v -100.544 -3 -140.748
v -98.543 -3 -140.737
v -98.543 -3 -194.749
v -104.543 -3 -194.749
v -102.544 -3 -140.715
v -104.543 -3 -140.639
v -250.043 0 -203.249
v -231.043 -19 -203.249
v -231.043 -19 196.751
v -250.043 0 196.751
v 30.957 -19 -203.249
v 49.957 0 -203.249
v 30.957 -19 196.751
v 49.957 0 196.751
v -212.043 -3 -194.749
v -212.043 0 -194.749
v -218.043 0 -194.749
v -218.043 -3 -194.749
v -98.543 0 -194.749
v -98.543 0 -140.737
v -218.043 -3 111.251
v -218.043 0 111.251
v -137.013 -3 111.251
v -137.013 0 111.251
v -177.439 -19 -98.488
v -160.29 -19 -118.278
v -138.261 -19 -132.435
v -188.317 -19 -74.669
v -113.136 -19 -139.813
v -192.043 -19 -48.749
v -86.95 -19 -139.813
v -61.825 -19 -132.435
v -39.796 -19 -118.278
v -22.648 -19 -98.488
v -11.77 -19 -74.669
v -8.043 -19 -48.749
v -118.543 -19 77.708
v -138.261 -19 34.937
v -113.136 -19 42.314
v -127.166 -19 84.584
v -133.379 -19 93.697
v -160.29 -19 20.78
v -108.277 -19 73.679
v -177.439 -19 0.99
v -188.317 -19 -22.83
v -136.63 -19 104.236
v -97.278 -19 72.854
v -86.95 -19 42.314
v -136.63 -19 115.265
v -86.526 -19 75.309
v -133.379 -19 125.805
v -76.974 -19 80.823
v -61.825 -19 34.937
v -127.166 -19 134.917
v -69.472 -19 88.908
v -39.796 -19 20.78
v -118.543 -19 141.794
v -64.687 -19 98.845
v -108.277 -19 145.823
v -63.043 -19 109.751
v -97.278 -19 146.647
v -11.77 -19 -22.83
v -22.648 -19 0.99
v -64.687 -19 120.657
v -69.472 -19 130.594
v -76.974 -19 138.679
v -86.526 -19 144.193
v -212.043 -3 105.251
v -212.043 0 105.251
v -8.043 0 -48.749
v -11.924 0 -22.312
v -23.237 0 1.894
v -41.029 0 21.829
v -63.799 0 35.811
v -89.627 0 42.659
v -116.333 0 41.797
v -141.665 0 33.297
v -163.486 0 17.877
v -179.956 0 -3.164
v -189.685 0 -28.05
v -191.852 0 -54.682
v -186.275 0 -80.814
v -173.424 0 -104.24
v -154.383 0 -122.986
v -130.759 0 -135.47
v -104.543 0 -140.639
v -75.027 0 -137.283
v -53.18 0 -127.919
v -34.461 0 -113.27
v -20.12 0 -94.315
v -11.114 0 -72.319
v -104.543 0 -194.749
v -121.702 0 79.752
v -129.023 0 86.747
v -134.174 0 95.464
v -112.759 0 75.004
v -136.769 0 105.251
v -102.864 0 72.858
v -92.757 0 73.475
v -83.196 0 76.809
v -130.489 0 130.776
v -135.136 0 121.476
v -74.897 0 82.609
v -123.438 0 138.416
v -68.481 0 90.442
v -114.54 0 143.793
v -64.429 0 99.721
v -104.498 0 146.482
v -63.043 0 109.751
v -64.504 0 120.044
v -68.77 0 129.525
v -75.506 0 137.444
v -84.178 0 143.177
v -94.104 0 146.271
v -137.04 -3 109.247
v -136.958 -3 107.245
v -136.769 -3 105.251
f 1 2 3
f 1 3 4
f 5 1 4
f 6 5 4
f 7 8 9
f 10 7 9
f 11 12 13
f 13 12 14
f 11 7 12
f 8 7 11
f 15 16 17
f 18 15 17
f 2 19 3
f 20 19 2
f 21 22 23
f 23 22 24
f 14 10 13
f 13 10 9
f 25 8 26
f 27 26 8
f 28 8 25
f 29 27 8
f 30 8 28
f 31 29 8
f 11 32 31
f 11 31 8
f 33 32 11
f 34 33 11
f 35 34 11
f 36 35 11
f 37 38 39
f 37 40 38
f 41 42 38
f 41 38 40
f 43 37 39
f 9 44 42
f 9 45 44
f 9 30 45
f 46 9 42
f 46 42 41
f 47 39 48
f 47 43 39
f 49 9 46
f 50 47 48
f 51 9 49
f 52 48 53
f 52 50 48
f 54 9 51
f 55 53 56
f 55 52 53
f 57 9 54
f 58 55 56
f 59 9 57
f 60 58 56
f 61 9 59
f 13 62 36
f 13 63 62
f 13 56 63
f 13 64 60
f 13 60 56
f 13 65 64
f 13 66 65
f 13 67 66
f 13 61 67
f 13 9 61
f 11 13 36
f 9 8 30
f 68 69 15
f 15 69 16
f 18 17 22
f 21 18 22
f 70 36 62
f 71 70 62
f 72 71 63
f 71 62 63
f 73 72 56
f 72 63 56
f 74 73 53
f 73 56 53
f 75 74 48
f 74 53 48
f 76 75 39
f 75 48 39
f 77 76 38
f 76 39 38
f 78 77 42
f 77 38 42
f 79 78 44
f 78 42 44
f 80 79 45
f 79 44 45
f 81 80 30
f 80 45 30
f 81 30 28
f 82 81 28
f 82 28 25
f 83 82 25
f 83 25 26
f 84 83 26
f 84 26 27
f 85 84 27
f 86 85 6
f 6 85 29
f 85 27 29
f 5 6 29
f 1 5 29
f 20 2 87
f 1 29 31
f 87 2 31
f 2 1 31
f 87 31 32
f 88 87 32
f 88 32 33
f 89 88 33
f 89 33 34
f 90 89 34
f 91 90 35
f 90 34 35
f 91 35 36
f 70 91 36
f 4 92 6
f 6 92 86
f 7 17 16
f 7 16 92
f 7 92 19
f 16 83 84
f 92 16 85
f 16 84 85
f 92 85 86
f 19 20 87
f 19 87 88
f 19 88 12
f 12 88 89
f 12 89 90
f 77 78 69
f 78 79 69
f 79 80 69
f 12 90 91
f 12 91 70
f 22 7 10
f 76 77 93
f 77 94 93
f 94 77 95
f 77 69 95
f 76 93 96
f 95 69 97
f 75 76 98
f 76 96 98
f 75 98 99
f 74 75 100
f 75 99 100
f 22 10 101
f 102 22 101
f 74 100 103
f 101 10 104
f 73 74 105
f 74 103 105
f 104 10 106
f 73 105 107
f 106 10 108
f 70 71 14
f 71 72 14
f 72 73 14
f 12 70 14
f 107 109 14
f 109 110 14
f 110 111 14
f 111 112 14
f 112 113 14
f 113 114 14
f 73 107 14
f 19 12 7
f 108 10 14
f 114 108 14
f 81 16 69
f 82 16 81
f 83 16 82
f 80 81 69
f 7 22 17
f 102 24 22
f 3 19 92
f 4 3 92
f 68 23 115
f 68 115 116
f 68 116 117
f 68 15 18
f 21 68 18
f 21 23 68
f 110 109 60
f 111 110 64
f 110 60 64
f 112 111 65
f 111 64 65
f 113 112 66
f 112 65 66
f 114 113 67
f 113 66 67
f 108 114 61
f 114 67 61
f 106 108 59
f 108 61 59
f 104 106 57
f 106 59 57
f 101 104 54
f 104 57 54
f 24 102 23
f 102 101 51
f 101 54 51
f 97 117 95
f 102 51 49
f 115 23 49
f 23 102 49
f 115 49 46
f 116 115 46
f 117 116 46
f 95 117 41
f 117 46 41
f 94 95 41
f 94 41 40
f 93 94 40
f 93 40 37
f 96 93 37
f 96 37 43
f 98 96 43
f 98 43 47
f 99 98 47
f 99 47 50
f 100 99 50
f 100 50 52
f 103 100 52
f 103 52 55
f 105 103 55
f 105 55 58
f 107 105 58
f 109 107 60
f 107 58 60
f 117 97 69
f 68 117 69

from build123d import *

# Parameters (mm, degrees)
F0_W     = 300
F0_H     = 400
F1_DEPTH = 19
F2_R     = 37
F2_R_2   = 92
F3_DEPTH = 19
F4_SIZE  = 18.99999
F6_DEPTH = 3
F7_W     = 6
F7_H     = 64.6666483516
F8_DEPTH = 3


# Not quite as in the source:
# - a fillet or chamfer is up to 0.001 mm smaller than in the source, because OpenCascade refuses the exact size


with BuildPart() as f1:
    # F0 (on Front) → F1 (new body)
    with BuildSketch(Plane.XZ):
        with Locations((-100.0432893634, -3.2491389651)):
            Rectangle(F0_W, F0_H)
    extrude(amount=F1_DEPTH)

    # F2 (on face) → F3 (cut)
    with BuildSketch(Plane.XZ.offset(19)):
        with Locations((-100.0432893634, 109.7508610349)):
            Circle(F2_R)
        with Locations((-100.0432893634, -48.7491389651)):
            Circle(F2_R_2)
    extrude(amount=-F3_DEPTH, mode=Mode.SUBTRACT)

    # F4 (size 19 in the source; OpenCascade refuses exactly that, so slightly less here)
    f4_edges = [f1.edges().sort_by_distance(p)[0] for p in [
        (-250.043289, -19, -3.249139),
        (49.956711, -19, -3.249139),
    ]]
    chamfer(f4_edges, length=F4_SIZE)

    # F5 (on face) → F6 (cut)
    with BuildSketch(Plane(origin=(0, 0, 0), x_dir=(-1, 0, 0), z_dir=(0, 1, 0))):
        Polygon((136.7686212203, 111.2508610349), (136.7686212203, 105.2508610349), (212.0432893634, 105.2508610349), (212.0432893634, -194.7491389651), (218.0432893634, -194.7491389651), (218.0432893634, 111.2508610349), align=None)
    extrude(amount=-F6_DEPTH, mode=Mode.SUBTRACT)

    # F7 (on face) → F8 (cut)
    with BuildSketch(Plane(origin=(0, 0, 0), x_dir=(-1, 0, 0), z_dir=(0, 1, 0))):
        with Locations((101.5432893634, -162.4158147893)):
            Rectangle(F7_W, F7_H)
    extrude(amount=-F8_DEPTH, mode=Mode.SUBTRACT)


solid = f1.part
